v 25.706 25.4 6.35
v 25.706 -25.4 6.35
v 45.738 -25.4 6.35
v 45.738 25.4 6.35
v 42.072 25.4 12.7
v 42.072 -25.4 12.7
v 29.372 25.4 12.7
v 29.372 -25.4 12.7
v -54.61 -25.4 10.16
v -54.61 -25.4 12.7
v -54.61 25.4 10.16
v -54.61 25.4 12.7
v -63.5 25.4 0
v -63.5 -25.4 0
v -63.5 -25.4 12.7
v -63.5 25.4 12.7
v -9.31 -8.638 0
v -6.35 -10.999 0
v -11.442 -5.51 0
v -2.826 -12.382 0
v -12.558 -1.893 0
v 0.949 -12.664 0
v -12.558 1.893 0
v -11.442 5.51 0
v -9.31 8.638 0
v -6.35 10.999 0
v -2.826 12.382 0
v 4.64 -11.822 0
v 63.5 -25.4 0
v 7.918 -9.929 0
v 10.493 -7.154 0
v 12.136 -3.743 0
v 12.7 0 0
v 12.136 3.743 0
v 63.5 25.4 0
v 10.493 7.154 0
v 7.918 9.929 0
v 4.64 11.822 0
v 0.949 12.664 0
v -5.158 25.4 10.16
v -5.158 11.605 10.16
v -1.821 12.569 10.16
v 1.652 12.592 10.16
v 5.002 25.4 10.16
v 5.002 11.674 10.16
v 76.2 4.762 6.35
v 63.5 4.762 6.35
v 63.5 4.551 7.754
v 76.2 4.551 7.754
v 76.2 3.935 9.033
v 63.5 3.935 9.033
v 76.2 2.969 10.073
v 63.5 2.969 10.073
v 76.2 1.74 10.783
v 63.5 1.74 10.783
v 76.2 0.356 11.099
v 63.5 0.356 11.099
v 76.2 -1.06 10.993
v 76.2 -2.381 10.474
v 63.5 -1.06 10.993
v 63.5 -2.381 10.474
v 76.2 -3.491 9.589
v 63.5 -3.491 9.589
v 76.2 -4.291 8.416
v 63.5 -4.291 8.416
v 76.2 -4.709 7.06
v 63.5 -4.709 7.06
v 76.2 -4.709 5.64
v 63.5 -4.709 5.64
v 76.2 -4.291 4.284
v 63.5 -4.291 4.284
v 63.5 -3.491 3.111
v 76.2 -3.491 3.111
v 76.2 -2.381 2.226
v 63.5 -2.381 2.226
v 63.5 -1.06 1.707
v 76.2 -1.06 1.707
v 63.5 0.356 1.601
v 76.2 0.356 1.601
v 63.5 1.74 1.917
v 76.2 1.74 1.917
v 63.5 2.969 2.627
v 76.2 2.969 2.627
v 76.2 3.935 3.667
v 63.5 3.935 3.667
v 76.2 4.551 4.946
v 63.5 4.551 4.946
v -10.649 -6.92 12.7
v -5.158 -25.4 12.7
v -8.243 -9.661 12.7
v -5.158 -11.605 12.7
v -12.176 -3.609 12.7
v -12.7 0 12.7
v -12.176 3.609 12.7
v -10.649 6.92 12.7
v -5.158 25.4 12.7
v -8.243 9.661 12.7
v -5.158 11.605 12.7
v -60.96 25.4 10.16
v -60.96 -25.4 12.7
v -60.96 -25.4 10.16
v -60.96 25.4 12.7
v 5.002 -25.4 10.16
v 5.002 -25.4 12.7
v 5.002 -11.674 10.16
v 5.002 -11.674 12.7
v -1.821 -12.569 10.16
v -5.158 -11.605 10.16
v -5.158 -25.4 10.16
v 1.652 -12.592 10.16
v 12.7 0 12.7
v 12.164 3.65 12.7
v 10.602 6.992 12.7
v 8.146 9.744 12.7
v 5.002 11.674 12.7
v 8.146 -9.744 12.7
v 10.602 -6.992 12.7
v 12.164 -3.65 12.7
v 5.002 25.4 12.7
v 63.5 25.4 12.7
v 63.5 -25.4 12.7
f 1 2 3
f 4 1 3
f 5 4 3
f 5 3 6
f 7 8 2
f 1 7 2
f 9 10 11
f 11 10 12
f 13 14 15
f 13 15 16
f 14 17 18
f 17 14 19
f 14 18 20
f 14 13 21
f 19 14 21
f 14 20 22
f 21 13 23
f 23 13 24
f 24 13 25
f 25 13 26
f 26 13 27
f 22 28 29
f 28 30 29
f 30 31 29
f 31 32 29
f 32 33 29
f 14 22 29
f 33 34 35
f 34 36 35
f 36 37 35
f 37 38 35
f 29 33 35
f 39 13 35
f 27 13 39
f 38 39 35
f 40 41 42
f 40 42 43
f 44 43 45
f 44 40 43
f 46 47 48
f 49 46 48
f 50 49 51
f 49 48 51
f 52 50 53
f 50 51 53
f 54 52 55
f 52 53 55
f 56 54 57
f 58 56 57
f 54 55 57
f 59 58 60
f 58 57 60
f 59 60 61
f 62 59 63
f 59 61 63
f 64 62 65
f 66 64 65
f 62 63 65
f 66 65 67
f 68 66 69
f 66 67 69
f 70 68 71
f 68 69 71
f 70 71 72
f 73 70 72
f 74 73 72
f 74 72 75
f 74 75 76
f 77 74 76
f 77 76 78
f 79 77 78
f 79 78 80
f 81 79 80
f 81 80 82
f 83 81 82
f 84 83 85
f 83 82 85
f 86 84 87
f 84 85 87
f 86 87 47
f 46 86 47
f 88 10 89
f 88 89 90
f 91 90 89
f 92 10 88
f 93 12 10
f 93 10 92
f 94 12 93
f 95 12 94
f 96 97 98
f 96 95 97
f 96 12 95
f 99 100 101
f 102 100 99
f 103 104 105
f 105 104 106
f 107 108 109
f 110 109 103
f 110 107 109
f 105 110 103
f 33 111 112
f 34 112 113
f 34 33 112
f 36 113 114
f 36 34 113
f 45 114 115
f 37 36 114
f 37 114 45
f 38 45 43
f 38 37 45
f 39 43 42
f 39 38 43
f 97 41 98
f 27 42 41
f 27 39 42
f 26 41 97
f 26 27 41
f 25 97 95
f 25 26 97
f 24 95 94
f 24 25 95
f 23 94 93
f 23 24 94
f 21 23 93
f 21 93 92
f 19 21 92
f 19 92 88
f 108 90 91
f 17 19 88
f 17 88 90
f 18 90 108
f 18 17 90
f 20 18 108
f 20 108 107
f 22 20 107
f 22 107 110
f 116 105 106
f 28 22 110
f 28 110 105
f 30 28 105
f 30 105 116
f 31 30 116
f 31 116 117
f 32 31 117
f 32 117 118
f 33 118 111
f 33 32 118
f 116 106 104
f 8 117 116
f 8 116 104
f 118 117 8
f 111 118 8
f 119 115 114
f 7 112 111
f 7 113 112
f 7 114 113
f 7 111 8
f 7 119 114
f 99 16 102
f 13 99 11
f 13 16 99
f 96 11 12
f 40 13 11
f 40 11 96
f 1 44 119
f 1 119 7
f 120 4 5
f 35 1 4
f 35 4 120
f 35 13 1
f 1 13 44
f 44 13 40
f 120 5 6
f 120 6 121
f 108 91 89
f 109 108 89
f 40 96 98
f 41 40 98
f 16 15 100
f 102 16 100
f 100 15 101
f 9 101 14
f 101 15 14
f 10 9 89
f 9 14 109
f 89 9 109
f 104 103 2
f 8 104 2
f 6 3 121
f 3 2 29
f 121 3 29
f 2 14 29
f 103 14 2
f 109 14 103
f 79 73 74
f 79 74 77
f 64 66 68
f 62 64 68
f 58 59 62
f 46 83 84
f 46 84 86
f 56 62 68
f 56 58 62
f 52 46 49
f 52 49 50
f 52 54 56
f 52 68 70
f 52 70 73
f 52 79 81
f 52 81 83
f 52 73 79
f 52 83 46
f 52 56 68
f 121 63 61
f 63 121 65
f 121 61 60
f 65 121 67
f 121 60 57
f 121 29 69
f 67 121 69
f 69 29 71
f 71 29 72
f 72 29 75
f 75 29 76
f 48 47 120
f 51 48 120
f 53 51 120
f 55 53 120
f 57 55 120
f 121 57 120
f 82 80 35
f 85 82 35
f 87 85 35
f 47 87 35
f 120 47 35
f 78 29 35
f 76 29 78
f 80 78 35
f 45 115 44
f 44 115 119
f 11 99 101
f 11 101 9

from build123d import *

# Parameters (mm, degrees)
F0_W     = 127
F0_H     = 50.8
F0_R     = 12.7
F1_DEPTH = 12.7
F2_W     = 6.35
F2_H     = 50.8
F3_DEPTH = 2.54
F5_DEPTH = 50.801
F6_R     = 4.7625
F7_DEPTH = 12.7


with BuildPart() as f1:
    # F0 (on Top) → F1 (new body)
    with BuildSketch(Plane.XY):
        Rectangle(F0_W, F0_H)
        Circle(F0_R, mode=Mode.SUBTRACT)
    extrude(amount=F1_DEPTH)

    # F2 (on face) → F3 (cut)
    with BuildSketch(Plane.XY.offset(12.7)):
        with BuildLine():
            Line((5.0018308049, 25.4), (-5.1581691951, 25.4))
            Line((-5.1581691951, 25.4), (-5.1581691951, 11.6053130313))
            ThreePointArc((-5.1581691951, 11.6053130313), (-0.0852899505, 12.699713604), (5.0018308049, 11.6735465305))
            Line((5.0018308049, 11.6735465305), (5.0018308049, 25.4))
        make_face()
        with BuildLine():
            Line((-5.1581691951, -11.6053130313), (-5.1581691951, -25.4))
            Line((-5.1581691951, -25.4), (5.0018308049, -25.4))
            Line((5.0018308049, -25.4), (5.0018308049, -11.6735465305))
            ThreePointArc((5.0018308049, -11.6735465305), (-0.0852899505, -12.699713604), (-5.1581691951, -11.6053130313))
        make_face()
        with Locations((-57.785, 0)):
            Rectangle(F2_W, F2_H)
    extrude(amount=-F3_DEPTH, mode=Mode.SUBTRACT)

    # F4 (on face) → F5 (cut, through all)
    with BuildSketch(Plane.XZ.offset(25.4)):
        Polygon((42.0720207126, 12.7), (29.3720207126, 12.7), (25.7058465033, 6.35), (45.738194922, 6.35), align=None)
    extrude(amount=-F5_DEPTH, mode=Mode.SUBTRACT)

    # F6 (on face) → F7 (join)
    with BuildSketch(Plane.YZ.offset(63.5)):
        with Locations((0, 6.35)):
            Circle(F6_R)
    extrude(amount=F7_DEPTH)


solid = f1.part
